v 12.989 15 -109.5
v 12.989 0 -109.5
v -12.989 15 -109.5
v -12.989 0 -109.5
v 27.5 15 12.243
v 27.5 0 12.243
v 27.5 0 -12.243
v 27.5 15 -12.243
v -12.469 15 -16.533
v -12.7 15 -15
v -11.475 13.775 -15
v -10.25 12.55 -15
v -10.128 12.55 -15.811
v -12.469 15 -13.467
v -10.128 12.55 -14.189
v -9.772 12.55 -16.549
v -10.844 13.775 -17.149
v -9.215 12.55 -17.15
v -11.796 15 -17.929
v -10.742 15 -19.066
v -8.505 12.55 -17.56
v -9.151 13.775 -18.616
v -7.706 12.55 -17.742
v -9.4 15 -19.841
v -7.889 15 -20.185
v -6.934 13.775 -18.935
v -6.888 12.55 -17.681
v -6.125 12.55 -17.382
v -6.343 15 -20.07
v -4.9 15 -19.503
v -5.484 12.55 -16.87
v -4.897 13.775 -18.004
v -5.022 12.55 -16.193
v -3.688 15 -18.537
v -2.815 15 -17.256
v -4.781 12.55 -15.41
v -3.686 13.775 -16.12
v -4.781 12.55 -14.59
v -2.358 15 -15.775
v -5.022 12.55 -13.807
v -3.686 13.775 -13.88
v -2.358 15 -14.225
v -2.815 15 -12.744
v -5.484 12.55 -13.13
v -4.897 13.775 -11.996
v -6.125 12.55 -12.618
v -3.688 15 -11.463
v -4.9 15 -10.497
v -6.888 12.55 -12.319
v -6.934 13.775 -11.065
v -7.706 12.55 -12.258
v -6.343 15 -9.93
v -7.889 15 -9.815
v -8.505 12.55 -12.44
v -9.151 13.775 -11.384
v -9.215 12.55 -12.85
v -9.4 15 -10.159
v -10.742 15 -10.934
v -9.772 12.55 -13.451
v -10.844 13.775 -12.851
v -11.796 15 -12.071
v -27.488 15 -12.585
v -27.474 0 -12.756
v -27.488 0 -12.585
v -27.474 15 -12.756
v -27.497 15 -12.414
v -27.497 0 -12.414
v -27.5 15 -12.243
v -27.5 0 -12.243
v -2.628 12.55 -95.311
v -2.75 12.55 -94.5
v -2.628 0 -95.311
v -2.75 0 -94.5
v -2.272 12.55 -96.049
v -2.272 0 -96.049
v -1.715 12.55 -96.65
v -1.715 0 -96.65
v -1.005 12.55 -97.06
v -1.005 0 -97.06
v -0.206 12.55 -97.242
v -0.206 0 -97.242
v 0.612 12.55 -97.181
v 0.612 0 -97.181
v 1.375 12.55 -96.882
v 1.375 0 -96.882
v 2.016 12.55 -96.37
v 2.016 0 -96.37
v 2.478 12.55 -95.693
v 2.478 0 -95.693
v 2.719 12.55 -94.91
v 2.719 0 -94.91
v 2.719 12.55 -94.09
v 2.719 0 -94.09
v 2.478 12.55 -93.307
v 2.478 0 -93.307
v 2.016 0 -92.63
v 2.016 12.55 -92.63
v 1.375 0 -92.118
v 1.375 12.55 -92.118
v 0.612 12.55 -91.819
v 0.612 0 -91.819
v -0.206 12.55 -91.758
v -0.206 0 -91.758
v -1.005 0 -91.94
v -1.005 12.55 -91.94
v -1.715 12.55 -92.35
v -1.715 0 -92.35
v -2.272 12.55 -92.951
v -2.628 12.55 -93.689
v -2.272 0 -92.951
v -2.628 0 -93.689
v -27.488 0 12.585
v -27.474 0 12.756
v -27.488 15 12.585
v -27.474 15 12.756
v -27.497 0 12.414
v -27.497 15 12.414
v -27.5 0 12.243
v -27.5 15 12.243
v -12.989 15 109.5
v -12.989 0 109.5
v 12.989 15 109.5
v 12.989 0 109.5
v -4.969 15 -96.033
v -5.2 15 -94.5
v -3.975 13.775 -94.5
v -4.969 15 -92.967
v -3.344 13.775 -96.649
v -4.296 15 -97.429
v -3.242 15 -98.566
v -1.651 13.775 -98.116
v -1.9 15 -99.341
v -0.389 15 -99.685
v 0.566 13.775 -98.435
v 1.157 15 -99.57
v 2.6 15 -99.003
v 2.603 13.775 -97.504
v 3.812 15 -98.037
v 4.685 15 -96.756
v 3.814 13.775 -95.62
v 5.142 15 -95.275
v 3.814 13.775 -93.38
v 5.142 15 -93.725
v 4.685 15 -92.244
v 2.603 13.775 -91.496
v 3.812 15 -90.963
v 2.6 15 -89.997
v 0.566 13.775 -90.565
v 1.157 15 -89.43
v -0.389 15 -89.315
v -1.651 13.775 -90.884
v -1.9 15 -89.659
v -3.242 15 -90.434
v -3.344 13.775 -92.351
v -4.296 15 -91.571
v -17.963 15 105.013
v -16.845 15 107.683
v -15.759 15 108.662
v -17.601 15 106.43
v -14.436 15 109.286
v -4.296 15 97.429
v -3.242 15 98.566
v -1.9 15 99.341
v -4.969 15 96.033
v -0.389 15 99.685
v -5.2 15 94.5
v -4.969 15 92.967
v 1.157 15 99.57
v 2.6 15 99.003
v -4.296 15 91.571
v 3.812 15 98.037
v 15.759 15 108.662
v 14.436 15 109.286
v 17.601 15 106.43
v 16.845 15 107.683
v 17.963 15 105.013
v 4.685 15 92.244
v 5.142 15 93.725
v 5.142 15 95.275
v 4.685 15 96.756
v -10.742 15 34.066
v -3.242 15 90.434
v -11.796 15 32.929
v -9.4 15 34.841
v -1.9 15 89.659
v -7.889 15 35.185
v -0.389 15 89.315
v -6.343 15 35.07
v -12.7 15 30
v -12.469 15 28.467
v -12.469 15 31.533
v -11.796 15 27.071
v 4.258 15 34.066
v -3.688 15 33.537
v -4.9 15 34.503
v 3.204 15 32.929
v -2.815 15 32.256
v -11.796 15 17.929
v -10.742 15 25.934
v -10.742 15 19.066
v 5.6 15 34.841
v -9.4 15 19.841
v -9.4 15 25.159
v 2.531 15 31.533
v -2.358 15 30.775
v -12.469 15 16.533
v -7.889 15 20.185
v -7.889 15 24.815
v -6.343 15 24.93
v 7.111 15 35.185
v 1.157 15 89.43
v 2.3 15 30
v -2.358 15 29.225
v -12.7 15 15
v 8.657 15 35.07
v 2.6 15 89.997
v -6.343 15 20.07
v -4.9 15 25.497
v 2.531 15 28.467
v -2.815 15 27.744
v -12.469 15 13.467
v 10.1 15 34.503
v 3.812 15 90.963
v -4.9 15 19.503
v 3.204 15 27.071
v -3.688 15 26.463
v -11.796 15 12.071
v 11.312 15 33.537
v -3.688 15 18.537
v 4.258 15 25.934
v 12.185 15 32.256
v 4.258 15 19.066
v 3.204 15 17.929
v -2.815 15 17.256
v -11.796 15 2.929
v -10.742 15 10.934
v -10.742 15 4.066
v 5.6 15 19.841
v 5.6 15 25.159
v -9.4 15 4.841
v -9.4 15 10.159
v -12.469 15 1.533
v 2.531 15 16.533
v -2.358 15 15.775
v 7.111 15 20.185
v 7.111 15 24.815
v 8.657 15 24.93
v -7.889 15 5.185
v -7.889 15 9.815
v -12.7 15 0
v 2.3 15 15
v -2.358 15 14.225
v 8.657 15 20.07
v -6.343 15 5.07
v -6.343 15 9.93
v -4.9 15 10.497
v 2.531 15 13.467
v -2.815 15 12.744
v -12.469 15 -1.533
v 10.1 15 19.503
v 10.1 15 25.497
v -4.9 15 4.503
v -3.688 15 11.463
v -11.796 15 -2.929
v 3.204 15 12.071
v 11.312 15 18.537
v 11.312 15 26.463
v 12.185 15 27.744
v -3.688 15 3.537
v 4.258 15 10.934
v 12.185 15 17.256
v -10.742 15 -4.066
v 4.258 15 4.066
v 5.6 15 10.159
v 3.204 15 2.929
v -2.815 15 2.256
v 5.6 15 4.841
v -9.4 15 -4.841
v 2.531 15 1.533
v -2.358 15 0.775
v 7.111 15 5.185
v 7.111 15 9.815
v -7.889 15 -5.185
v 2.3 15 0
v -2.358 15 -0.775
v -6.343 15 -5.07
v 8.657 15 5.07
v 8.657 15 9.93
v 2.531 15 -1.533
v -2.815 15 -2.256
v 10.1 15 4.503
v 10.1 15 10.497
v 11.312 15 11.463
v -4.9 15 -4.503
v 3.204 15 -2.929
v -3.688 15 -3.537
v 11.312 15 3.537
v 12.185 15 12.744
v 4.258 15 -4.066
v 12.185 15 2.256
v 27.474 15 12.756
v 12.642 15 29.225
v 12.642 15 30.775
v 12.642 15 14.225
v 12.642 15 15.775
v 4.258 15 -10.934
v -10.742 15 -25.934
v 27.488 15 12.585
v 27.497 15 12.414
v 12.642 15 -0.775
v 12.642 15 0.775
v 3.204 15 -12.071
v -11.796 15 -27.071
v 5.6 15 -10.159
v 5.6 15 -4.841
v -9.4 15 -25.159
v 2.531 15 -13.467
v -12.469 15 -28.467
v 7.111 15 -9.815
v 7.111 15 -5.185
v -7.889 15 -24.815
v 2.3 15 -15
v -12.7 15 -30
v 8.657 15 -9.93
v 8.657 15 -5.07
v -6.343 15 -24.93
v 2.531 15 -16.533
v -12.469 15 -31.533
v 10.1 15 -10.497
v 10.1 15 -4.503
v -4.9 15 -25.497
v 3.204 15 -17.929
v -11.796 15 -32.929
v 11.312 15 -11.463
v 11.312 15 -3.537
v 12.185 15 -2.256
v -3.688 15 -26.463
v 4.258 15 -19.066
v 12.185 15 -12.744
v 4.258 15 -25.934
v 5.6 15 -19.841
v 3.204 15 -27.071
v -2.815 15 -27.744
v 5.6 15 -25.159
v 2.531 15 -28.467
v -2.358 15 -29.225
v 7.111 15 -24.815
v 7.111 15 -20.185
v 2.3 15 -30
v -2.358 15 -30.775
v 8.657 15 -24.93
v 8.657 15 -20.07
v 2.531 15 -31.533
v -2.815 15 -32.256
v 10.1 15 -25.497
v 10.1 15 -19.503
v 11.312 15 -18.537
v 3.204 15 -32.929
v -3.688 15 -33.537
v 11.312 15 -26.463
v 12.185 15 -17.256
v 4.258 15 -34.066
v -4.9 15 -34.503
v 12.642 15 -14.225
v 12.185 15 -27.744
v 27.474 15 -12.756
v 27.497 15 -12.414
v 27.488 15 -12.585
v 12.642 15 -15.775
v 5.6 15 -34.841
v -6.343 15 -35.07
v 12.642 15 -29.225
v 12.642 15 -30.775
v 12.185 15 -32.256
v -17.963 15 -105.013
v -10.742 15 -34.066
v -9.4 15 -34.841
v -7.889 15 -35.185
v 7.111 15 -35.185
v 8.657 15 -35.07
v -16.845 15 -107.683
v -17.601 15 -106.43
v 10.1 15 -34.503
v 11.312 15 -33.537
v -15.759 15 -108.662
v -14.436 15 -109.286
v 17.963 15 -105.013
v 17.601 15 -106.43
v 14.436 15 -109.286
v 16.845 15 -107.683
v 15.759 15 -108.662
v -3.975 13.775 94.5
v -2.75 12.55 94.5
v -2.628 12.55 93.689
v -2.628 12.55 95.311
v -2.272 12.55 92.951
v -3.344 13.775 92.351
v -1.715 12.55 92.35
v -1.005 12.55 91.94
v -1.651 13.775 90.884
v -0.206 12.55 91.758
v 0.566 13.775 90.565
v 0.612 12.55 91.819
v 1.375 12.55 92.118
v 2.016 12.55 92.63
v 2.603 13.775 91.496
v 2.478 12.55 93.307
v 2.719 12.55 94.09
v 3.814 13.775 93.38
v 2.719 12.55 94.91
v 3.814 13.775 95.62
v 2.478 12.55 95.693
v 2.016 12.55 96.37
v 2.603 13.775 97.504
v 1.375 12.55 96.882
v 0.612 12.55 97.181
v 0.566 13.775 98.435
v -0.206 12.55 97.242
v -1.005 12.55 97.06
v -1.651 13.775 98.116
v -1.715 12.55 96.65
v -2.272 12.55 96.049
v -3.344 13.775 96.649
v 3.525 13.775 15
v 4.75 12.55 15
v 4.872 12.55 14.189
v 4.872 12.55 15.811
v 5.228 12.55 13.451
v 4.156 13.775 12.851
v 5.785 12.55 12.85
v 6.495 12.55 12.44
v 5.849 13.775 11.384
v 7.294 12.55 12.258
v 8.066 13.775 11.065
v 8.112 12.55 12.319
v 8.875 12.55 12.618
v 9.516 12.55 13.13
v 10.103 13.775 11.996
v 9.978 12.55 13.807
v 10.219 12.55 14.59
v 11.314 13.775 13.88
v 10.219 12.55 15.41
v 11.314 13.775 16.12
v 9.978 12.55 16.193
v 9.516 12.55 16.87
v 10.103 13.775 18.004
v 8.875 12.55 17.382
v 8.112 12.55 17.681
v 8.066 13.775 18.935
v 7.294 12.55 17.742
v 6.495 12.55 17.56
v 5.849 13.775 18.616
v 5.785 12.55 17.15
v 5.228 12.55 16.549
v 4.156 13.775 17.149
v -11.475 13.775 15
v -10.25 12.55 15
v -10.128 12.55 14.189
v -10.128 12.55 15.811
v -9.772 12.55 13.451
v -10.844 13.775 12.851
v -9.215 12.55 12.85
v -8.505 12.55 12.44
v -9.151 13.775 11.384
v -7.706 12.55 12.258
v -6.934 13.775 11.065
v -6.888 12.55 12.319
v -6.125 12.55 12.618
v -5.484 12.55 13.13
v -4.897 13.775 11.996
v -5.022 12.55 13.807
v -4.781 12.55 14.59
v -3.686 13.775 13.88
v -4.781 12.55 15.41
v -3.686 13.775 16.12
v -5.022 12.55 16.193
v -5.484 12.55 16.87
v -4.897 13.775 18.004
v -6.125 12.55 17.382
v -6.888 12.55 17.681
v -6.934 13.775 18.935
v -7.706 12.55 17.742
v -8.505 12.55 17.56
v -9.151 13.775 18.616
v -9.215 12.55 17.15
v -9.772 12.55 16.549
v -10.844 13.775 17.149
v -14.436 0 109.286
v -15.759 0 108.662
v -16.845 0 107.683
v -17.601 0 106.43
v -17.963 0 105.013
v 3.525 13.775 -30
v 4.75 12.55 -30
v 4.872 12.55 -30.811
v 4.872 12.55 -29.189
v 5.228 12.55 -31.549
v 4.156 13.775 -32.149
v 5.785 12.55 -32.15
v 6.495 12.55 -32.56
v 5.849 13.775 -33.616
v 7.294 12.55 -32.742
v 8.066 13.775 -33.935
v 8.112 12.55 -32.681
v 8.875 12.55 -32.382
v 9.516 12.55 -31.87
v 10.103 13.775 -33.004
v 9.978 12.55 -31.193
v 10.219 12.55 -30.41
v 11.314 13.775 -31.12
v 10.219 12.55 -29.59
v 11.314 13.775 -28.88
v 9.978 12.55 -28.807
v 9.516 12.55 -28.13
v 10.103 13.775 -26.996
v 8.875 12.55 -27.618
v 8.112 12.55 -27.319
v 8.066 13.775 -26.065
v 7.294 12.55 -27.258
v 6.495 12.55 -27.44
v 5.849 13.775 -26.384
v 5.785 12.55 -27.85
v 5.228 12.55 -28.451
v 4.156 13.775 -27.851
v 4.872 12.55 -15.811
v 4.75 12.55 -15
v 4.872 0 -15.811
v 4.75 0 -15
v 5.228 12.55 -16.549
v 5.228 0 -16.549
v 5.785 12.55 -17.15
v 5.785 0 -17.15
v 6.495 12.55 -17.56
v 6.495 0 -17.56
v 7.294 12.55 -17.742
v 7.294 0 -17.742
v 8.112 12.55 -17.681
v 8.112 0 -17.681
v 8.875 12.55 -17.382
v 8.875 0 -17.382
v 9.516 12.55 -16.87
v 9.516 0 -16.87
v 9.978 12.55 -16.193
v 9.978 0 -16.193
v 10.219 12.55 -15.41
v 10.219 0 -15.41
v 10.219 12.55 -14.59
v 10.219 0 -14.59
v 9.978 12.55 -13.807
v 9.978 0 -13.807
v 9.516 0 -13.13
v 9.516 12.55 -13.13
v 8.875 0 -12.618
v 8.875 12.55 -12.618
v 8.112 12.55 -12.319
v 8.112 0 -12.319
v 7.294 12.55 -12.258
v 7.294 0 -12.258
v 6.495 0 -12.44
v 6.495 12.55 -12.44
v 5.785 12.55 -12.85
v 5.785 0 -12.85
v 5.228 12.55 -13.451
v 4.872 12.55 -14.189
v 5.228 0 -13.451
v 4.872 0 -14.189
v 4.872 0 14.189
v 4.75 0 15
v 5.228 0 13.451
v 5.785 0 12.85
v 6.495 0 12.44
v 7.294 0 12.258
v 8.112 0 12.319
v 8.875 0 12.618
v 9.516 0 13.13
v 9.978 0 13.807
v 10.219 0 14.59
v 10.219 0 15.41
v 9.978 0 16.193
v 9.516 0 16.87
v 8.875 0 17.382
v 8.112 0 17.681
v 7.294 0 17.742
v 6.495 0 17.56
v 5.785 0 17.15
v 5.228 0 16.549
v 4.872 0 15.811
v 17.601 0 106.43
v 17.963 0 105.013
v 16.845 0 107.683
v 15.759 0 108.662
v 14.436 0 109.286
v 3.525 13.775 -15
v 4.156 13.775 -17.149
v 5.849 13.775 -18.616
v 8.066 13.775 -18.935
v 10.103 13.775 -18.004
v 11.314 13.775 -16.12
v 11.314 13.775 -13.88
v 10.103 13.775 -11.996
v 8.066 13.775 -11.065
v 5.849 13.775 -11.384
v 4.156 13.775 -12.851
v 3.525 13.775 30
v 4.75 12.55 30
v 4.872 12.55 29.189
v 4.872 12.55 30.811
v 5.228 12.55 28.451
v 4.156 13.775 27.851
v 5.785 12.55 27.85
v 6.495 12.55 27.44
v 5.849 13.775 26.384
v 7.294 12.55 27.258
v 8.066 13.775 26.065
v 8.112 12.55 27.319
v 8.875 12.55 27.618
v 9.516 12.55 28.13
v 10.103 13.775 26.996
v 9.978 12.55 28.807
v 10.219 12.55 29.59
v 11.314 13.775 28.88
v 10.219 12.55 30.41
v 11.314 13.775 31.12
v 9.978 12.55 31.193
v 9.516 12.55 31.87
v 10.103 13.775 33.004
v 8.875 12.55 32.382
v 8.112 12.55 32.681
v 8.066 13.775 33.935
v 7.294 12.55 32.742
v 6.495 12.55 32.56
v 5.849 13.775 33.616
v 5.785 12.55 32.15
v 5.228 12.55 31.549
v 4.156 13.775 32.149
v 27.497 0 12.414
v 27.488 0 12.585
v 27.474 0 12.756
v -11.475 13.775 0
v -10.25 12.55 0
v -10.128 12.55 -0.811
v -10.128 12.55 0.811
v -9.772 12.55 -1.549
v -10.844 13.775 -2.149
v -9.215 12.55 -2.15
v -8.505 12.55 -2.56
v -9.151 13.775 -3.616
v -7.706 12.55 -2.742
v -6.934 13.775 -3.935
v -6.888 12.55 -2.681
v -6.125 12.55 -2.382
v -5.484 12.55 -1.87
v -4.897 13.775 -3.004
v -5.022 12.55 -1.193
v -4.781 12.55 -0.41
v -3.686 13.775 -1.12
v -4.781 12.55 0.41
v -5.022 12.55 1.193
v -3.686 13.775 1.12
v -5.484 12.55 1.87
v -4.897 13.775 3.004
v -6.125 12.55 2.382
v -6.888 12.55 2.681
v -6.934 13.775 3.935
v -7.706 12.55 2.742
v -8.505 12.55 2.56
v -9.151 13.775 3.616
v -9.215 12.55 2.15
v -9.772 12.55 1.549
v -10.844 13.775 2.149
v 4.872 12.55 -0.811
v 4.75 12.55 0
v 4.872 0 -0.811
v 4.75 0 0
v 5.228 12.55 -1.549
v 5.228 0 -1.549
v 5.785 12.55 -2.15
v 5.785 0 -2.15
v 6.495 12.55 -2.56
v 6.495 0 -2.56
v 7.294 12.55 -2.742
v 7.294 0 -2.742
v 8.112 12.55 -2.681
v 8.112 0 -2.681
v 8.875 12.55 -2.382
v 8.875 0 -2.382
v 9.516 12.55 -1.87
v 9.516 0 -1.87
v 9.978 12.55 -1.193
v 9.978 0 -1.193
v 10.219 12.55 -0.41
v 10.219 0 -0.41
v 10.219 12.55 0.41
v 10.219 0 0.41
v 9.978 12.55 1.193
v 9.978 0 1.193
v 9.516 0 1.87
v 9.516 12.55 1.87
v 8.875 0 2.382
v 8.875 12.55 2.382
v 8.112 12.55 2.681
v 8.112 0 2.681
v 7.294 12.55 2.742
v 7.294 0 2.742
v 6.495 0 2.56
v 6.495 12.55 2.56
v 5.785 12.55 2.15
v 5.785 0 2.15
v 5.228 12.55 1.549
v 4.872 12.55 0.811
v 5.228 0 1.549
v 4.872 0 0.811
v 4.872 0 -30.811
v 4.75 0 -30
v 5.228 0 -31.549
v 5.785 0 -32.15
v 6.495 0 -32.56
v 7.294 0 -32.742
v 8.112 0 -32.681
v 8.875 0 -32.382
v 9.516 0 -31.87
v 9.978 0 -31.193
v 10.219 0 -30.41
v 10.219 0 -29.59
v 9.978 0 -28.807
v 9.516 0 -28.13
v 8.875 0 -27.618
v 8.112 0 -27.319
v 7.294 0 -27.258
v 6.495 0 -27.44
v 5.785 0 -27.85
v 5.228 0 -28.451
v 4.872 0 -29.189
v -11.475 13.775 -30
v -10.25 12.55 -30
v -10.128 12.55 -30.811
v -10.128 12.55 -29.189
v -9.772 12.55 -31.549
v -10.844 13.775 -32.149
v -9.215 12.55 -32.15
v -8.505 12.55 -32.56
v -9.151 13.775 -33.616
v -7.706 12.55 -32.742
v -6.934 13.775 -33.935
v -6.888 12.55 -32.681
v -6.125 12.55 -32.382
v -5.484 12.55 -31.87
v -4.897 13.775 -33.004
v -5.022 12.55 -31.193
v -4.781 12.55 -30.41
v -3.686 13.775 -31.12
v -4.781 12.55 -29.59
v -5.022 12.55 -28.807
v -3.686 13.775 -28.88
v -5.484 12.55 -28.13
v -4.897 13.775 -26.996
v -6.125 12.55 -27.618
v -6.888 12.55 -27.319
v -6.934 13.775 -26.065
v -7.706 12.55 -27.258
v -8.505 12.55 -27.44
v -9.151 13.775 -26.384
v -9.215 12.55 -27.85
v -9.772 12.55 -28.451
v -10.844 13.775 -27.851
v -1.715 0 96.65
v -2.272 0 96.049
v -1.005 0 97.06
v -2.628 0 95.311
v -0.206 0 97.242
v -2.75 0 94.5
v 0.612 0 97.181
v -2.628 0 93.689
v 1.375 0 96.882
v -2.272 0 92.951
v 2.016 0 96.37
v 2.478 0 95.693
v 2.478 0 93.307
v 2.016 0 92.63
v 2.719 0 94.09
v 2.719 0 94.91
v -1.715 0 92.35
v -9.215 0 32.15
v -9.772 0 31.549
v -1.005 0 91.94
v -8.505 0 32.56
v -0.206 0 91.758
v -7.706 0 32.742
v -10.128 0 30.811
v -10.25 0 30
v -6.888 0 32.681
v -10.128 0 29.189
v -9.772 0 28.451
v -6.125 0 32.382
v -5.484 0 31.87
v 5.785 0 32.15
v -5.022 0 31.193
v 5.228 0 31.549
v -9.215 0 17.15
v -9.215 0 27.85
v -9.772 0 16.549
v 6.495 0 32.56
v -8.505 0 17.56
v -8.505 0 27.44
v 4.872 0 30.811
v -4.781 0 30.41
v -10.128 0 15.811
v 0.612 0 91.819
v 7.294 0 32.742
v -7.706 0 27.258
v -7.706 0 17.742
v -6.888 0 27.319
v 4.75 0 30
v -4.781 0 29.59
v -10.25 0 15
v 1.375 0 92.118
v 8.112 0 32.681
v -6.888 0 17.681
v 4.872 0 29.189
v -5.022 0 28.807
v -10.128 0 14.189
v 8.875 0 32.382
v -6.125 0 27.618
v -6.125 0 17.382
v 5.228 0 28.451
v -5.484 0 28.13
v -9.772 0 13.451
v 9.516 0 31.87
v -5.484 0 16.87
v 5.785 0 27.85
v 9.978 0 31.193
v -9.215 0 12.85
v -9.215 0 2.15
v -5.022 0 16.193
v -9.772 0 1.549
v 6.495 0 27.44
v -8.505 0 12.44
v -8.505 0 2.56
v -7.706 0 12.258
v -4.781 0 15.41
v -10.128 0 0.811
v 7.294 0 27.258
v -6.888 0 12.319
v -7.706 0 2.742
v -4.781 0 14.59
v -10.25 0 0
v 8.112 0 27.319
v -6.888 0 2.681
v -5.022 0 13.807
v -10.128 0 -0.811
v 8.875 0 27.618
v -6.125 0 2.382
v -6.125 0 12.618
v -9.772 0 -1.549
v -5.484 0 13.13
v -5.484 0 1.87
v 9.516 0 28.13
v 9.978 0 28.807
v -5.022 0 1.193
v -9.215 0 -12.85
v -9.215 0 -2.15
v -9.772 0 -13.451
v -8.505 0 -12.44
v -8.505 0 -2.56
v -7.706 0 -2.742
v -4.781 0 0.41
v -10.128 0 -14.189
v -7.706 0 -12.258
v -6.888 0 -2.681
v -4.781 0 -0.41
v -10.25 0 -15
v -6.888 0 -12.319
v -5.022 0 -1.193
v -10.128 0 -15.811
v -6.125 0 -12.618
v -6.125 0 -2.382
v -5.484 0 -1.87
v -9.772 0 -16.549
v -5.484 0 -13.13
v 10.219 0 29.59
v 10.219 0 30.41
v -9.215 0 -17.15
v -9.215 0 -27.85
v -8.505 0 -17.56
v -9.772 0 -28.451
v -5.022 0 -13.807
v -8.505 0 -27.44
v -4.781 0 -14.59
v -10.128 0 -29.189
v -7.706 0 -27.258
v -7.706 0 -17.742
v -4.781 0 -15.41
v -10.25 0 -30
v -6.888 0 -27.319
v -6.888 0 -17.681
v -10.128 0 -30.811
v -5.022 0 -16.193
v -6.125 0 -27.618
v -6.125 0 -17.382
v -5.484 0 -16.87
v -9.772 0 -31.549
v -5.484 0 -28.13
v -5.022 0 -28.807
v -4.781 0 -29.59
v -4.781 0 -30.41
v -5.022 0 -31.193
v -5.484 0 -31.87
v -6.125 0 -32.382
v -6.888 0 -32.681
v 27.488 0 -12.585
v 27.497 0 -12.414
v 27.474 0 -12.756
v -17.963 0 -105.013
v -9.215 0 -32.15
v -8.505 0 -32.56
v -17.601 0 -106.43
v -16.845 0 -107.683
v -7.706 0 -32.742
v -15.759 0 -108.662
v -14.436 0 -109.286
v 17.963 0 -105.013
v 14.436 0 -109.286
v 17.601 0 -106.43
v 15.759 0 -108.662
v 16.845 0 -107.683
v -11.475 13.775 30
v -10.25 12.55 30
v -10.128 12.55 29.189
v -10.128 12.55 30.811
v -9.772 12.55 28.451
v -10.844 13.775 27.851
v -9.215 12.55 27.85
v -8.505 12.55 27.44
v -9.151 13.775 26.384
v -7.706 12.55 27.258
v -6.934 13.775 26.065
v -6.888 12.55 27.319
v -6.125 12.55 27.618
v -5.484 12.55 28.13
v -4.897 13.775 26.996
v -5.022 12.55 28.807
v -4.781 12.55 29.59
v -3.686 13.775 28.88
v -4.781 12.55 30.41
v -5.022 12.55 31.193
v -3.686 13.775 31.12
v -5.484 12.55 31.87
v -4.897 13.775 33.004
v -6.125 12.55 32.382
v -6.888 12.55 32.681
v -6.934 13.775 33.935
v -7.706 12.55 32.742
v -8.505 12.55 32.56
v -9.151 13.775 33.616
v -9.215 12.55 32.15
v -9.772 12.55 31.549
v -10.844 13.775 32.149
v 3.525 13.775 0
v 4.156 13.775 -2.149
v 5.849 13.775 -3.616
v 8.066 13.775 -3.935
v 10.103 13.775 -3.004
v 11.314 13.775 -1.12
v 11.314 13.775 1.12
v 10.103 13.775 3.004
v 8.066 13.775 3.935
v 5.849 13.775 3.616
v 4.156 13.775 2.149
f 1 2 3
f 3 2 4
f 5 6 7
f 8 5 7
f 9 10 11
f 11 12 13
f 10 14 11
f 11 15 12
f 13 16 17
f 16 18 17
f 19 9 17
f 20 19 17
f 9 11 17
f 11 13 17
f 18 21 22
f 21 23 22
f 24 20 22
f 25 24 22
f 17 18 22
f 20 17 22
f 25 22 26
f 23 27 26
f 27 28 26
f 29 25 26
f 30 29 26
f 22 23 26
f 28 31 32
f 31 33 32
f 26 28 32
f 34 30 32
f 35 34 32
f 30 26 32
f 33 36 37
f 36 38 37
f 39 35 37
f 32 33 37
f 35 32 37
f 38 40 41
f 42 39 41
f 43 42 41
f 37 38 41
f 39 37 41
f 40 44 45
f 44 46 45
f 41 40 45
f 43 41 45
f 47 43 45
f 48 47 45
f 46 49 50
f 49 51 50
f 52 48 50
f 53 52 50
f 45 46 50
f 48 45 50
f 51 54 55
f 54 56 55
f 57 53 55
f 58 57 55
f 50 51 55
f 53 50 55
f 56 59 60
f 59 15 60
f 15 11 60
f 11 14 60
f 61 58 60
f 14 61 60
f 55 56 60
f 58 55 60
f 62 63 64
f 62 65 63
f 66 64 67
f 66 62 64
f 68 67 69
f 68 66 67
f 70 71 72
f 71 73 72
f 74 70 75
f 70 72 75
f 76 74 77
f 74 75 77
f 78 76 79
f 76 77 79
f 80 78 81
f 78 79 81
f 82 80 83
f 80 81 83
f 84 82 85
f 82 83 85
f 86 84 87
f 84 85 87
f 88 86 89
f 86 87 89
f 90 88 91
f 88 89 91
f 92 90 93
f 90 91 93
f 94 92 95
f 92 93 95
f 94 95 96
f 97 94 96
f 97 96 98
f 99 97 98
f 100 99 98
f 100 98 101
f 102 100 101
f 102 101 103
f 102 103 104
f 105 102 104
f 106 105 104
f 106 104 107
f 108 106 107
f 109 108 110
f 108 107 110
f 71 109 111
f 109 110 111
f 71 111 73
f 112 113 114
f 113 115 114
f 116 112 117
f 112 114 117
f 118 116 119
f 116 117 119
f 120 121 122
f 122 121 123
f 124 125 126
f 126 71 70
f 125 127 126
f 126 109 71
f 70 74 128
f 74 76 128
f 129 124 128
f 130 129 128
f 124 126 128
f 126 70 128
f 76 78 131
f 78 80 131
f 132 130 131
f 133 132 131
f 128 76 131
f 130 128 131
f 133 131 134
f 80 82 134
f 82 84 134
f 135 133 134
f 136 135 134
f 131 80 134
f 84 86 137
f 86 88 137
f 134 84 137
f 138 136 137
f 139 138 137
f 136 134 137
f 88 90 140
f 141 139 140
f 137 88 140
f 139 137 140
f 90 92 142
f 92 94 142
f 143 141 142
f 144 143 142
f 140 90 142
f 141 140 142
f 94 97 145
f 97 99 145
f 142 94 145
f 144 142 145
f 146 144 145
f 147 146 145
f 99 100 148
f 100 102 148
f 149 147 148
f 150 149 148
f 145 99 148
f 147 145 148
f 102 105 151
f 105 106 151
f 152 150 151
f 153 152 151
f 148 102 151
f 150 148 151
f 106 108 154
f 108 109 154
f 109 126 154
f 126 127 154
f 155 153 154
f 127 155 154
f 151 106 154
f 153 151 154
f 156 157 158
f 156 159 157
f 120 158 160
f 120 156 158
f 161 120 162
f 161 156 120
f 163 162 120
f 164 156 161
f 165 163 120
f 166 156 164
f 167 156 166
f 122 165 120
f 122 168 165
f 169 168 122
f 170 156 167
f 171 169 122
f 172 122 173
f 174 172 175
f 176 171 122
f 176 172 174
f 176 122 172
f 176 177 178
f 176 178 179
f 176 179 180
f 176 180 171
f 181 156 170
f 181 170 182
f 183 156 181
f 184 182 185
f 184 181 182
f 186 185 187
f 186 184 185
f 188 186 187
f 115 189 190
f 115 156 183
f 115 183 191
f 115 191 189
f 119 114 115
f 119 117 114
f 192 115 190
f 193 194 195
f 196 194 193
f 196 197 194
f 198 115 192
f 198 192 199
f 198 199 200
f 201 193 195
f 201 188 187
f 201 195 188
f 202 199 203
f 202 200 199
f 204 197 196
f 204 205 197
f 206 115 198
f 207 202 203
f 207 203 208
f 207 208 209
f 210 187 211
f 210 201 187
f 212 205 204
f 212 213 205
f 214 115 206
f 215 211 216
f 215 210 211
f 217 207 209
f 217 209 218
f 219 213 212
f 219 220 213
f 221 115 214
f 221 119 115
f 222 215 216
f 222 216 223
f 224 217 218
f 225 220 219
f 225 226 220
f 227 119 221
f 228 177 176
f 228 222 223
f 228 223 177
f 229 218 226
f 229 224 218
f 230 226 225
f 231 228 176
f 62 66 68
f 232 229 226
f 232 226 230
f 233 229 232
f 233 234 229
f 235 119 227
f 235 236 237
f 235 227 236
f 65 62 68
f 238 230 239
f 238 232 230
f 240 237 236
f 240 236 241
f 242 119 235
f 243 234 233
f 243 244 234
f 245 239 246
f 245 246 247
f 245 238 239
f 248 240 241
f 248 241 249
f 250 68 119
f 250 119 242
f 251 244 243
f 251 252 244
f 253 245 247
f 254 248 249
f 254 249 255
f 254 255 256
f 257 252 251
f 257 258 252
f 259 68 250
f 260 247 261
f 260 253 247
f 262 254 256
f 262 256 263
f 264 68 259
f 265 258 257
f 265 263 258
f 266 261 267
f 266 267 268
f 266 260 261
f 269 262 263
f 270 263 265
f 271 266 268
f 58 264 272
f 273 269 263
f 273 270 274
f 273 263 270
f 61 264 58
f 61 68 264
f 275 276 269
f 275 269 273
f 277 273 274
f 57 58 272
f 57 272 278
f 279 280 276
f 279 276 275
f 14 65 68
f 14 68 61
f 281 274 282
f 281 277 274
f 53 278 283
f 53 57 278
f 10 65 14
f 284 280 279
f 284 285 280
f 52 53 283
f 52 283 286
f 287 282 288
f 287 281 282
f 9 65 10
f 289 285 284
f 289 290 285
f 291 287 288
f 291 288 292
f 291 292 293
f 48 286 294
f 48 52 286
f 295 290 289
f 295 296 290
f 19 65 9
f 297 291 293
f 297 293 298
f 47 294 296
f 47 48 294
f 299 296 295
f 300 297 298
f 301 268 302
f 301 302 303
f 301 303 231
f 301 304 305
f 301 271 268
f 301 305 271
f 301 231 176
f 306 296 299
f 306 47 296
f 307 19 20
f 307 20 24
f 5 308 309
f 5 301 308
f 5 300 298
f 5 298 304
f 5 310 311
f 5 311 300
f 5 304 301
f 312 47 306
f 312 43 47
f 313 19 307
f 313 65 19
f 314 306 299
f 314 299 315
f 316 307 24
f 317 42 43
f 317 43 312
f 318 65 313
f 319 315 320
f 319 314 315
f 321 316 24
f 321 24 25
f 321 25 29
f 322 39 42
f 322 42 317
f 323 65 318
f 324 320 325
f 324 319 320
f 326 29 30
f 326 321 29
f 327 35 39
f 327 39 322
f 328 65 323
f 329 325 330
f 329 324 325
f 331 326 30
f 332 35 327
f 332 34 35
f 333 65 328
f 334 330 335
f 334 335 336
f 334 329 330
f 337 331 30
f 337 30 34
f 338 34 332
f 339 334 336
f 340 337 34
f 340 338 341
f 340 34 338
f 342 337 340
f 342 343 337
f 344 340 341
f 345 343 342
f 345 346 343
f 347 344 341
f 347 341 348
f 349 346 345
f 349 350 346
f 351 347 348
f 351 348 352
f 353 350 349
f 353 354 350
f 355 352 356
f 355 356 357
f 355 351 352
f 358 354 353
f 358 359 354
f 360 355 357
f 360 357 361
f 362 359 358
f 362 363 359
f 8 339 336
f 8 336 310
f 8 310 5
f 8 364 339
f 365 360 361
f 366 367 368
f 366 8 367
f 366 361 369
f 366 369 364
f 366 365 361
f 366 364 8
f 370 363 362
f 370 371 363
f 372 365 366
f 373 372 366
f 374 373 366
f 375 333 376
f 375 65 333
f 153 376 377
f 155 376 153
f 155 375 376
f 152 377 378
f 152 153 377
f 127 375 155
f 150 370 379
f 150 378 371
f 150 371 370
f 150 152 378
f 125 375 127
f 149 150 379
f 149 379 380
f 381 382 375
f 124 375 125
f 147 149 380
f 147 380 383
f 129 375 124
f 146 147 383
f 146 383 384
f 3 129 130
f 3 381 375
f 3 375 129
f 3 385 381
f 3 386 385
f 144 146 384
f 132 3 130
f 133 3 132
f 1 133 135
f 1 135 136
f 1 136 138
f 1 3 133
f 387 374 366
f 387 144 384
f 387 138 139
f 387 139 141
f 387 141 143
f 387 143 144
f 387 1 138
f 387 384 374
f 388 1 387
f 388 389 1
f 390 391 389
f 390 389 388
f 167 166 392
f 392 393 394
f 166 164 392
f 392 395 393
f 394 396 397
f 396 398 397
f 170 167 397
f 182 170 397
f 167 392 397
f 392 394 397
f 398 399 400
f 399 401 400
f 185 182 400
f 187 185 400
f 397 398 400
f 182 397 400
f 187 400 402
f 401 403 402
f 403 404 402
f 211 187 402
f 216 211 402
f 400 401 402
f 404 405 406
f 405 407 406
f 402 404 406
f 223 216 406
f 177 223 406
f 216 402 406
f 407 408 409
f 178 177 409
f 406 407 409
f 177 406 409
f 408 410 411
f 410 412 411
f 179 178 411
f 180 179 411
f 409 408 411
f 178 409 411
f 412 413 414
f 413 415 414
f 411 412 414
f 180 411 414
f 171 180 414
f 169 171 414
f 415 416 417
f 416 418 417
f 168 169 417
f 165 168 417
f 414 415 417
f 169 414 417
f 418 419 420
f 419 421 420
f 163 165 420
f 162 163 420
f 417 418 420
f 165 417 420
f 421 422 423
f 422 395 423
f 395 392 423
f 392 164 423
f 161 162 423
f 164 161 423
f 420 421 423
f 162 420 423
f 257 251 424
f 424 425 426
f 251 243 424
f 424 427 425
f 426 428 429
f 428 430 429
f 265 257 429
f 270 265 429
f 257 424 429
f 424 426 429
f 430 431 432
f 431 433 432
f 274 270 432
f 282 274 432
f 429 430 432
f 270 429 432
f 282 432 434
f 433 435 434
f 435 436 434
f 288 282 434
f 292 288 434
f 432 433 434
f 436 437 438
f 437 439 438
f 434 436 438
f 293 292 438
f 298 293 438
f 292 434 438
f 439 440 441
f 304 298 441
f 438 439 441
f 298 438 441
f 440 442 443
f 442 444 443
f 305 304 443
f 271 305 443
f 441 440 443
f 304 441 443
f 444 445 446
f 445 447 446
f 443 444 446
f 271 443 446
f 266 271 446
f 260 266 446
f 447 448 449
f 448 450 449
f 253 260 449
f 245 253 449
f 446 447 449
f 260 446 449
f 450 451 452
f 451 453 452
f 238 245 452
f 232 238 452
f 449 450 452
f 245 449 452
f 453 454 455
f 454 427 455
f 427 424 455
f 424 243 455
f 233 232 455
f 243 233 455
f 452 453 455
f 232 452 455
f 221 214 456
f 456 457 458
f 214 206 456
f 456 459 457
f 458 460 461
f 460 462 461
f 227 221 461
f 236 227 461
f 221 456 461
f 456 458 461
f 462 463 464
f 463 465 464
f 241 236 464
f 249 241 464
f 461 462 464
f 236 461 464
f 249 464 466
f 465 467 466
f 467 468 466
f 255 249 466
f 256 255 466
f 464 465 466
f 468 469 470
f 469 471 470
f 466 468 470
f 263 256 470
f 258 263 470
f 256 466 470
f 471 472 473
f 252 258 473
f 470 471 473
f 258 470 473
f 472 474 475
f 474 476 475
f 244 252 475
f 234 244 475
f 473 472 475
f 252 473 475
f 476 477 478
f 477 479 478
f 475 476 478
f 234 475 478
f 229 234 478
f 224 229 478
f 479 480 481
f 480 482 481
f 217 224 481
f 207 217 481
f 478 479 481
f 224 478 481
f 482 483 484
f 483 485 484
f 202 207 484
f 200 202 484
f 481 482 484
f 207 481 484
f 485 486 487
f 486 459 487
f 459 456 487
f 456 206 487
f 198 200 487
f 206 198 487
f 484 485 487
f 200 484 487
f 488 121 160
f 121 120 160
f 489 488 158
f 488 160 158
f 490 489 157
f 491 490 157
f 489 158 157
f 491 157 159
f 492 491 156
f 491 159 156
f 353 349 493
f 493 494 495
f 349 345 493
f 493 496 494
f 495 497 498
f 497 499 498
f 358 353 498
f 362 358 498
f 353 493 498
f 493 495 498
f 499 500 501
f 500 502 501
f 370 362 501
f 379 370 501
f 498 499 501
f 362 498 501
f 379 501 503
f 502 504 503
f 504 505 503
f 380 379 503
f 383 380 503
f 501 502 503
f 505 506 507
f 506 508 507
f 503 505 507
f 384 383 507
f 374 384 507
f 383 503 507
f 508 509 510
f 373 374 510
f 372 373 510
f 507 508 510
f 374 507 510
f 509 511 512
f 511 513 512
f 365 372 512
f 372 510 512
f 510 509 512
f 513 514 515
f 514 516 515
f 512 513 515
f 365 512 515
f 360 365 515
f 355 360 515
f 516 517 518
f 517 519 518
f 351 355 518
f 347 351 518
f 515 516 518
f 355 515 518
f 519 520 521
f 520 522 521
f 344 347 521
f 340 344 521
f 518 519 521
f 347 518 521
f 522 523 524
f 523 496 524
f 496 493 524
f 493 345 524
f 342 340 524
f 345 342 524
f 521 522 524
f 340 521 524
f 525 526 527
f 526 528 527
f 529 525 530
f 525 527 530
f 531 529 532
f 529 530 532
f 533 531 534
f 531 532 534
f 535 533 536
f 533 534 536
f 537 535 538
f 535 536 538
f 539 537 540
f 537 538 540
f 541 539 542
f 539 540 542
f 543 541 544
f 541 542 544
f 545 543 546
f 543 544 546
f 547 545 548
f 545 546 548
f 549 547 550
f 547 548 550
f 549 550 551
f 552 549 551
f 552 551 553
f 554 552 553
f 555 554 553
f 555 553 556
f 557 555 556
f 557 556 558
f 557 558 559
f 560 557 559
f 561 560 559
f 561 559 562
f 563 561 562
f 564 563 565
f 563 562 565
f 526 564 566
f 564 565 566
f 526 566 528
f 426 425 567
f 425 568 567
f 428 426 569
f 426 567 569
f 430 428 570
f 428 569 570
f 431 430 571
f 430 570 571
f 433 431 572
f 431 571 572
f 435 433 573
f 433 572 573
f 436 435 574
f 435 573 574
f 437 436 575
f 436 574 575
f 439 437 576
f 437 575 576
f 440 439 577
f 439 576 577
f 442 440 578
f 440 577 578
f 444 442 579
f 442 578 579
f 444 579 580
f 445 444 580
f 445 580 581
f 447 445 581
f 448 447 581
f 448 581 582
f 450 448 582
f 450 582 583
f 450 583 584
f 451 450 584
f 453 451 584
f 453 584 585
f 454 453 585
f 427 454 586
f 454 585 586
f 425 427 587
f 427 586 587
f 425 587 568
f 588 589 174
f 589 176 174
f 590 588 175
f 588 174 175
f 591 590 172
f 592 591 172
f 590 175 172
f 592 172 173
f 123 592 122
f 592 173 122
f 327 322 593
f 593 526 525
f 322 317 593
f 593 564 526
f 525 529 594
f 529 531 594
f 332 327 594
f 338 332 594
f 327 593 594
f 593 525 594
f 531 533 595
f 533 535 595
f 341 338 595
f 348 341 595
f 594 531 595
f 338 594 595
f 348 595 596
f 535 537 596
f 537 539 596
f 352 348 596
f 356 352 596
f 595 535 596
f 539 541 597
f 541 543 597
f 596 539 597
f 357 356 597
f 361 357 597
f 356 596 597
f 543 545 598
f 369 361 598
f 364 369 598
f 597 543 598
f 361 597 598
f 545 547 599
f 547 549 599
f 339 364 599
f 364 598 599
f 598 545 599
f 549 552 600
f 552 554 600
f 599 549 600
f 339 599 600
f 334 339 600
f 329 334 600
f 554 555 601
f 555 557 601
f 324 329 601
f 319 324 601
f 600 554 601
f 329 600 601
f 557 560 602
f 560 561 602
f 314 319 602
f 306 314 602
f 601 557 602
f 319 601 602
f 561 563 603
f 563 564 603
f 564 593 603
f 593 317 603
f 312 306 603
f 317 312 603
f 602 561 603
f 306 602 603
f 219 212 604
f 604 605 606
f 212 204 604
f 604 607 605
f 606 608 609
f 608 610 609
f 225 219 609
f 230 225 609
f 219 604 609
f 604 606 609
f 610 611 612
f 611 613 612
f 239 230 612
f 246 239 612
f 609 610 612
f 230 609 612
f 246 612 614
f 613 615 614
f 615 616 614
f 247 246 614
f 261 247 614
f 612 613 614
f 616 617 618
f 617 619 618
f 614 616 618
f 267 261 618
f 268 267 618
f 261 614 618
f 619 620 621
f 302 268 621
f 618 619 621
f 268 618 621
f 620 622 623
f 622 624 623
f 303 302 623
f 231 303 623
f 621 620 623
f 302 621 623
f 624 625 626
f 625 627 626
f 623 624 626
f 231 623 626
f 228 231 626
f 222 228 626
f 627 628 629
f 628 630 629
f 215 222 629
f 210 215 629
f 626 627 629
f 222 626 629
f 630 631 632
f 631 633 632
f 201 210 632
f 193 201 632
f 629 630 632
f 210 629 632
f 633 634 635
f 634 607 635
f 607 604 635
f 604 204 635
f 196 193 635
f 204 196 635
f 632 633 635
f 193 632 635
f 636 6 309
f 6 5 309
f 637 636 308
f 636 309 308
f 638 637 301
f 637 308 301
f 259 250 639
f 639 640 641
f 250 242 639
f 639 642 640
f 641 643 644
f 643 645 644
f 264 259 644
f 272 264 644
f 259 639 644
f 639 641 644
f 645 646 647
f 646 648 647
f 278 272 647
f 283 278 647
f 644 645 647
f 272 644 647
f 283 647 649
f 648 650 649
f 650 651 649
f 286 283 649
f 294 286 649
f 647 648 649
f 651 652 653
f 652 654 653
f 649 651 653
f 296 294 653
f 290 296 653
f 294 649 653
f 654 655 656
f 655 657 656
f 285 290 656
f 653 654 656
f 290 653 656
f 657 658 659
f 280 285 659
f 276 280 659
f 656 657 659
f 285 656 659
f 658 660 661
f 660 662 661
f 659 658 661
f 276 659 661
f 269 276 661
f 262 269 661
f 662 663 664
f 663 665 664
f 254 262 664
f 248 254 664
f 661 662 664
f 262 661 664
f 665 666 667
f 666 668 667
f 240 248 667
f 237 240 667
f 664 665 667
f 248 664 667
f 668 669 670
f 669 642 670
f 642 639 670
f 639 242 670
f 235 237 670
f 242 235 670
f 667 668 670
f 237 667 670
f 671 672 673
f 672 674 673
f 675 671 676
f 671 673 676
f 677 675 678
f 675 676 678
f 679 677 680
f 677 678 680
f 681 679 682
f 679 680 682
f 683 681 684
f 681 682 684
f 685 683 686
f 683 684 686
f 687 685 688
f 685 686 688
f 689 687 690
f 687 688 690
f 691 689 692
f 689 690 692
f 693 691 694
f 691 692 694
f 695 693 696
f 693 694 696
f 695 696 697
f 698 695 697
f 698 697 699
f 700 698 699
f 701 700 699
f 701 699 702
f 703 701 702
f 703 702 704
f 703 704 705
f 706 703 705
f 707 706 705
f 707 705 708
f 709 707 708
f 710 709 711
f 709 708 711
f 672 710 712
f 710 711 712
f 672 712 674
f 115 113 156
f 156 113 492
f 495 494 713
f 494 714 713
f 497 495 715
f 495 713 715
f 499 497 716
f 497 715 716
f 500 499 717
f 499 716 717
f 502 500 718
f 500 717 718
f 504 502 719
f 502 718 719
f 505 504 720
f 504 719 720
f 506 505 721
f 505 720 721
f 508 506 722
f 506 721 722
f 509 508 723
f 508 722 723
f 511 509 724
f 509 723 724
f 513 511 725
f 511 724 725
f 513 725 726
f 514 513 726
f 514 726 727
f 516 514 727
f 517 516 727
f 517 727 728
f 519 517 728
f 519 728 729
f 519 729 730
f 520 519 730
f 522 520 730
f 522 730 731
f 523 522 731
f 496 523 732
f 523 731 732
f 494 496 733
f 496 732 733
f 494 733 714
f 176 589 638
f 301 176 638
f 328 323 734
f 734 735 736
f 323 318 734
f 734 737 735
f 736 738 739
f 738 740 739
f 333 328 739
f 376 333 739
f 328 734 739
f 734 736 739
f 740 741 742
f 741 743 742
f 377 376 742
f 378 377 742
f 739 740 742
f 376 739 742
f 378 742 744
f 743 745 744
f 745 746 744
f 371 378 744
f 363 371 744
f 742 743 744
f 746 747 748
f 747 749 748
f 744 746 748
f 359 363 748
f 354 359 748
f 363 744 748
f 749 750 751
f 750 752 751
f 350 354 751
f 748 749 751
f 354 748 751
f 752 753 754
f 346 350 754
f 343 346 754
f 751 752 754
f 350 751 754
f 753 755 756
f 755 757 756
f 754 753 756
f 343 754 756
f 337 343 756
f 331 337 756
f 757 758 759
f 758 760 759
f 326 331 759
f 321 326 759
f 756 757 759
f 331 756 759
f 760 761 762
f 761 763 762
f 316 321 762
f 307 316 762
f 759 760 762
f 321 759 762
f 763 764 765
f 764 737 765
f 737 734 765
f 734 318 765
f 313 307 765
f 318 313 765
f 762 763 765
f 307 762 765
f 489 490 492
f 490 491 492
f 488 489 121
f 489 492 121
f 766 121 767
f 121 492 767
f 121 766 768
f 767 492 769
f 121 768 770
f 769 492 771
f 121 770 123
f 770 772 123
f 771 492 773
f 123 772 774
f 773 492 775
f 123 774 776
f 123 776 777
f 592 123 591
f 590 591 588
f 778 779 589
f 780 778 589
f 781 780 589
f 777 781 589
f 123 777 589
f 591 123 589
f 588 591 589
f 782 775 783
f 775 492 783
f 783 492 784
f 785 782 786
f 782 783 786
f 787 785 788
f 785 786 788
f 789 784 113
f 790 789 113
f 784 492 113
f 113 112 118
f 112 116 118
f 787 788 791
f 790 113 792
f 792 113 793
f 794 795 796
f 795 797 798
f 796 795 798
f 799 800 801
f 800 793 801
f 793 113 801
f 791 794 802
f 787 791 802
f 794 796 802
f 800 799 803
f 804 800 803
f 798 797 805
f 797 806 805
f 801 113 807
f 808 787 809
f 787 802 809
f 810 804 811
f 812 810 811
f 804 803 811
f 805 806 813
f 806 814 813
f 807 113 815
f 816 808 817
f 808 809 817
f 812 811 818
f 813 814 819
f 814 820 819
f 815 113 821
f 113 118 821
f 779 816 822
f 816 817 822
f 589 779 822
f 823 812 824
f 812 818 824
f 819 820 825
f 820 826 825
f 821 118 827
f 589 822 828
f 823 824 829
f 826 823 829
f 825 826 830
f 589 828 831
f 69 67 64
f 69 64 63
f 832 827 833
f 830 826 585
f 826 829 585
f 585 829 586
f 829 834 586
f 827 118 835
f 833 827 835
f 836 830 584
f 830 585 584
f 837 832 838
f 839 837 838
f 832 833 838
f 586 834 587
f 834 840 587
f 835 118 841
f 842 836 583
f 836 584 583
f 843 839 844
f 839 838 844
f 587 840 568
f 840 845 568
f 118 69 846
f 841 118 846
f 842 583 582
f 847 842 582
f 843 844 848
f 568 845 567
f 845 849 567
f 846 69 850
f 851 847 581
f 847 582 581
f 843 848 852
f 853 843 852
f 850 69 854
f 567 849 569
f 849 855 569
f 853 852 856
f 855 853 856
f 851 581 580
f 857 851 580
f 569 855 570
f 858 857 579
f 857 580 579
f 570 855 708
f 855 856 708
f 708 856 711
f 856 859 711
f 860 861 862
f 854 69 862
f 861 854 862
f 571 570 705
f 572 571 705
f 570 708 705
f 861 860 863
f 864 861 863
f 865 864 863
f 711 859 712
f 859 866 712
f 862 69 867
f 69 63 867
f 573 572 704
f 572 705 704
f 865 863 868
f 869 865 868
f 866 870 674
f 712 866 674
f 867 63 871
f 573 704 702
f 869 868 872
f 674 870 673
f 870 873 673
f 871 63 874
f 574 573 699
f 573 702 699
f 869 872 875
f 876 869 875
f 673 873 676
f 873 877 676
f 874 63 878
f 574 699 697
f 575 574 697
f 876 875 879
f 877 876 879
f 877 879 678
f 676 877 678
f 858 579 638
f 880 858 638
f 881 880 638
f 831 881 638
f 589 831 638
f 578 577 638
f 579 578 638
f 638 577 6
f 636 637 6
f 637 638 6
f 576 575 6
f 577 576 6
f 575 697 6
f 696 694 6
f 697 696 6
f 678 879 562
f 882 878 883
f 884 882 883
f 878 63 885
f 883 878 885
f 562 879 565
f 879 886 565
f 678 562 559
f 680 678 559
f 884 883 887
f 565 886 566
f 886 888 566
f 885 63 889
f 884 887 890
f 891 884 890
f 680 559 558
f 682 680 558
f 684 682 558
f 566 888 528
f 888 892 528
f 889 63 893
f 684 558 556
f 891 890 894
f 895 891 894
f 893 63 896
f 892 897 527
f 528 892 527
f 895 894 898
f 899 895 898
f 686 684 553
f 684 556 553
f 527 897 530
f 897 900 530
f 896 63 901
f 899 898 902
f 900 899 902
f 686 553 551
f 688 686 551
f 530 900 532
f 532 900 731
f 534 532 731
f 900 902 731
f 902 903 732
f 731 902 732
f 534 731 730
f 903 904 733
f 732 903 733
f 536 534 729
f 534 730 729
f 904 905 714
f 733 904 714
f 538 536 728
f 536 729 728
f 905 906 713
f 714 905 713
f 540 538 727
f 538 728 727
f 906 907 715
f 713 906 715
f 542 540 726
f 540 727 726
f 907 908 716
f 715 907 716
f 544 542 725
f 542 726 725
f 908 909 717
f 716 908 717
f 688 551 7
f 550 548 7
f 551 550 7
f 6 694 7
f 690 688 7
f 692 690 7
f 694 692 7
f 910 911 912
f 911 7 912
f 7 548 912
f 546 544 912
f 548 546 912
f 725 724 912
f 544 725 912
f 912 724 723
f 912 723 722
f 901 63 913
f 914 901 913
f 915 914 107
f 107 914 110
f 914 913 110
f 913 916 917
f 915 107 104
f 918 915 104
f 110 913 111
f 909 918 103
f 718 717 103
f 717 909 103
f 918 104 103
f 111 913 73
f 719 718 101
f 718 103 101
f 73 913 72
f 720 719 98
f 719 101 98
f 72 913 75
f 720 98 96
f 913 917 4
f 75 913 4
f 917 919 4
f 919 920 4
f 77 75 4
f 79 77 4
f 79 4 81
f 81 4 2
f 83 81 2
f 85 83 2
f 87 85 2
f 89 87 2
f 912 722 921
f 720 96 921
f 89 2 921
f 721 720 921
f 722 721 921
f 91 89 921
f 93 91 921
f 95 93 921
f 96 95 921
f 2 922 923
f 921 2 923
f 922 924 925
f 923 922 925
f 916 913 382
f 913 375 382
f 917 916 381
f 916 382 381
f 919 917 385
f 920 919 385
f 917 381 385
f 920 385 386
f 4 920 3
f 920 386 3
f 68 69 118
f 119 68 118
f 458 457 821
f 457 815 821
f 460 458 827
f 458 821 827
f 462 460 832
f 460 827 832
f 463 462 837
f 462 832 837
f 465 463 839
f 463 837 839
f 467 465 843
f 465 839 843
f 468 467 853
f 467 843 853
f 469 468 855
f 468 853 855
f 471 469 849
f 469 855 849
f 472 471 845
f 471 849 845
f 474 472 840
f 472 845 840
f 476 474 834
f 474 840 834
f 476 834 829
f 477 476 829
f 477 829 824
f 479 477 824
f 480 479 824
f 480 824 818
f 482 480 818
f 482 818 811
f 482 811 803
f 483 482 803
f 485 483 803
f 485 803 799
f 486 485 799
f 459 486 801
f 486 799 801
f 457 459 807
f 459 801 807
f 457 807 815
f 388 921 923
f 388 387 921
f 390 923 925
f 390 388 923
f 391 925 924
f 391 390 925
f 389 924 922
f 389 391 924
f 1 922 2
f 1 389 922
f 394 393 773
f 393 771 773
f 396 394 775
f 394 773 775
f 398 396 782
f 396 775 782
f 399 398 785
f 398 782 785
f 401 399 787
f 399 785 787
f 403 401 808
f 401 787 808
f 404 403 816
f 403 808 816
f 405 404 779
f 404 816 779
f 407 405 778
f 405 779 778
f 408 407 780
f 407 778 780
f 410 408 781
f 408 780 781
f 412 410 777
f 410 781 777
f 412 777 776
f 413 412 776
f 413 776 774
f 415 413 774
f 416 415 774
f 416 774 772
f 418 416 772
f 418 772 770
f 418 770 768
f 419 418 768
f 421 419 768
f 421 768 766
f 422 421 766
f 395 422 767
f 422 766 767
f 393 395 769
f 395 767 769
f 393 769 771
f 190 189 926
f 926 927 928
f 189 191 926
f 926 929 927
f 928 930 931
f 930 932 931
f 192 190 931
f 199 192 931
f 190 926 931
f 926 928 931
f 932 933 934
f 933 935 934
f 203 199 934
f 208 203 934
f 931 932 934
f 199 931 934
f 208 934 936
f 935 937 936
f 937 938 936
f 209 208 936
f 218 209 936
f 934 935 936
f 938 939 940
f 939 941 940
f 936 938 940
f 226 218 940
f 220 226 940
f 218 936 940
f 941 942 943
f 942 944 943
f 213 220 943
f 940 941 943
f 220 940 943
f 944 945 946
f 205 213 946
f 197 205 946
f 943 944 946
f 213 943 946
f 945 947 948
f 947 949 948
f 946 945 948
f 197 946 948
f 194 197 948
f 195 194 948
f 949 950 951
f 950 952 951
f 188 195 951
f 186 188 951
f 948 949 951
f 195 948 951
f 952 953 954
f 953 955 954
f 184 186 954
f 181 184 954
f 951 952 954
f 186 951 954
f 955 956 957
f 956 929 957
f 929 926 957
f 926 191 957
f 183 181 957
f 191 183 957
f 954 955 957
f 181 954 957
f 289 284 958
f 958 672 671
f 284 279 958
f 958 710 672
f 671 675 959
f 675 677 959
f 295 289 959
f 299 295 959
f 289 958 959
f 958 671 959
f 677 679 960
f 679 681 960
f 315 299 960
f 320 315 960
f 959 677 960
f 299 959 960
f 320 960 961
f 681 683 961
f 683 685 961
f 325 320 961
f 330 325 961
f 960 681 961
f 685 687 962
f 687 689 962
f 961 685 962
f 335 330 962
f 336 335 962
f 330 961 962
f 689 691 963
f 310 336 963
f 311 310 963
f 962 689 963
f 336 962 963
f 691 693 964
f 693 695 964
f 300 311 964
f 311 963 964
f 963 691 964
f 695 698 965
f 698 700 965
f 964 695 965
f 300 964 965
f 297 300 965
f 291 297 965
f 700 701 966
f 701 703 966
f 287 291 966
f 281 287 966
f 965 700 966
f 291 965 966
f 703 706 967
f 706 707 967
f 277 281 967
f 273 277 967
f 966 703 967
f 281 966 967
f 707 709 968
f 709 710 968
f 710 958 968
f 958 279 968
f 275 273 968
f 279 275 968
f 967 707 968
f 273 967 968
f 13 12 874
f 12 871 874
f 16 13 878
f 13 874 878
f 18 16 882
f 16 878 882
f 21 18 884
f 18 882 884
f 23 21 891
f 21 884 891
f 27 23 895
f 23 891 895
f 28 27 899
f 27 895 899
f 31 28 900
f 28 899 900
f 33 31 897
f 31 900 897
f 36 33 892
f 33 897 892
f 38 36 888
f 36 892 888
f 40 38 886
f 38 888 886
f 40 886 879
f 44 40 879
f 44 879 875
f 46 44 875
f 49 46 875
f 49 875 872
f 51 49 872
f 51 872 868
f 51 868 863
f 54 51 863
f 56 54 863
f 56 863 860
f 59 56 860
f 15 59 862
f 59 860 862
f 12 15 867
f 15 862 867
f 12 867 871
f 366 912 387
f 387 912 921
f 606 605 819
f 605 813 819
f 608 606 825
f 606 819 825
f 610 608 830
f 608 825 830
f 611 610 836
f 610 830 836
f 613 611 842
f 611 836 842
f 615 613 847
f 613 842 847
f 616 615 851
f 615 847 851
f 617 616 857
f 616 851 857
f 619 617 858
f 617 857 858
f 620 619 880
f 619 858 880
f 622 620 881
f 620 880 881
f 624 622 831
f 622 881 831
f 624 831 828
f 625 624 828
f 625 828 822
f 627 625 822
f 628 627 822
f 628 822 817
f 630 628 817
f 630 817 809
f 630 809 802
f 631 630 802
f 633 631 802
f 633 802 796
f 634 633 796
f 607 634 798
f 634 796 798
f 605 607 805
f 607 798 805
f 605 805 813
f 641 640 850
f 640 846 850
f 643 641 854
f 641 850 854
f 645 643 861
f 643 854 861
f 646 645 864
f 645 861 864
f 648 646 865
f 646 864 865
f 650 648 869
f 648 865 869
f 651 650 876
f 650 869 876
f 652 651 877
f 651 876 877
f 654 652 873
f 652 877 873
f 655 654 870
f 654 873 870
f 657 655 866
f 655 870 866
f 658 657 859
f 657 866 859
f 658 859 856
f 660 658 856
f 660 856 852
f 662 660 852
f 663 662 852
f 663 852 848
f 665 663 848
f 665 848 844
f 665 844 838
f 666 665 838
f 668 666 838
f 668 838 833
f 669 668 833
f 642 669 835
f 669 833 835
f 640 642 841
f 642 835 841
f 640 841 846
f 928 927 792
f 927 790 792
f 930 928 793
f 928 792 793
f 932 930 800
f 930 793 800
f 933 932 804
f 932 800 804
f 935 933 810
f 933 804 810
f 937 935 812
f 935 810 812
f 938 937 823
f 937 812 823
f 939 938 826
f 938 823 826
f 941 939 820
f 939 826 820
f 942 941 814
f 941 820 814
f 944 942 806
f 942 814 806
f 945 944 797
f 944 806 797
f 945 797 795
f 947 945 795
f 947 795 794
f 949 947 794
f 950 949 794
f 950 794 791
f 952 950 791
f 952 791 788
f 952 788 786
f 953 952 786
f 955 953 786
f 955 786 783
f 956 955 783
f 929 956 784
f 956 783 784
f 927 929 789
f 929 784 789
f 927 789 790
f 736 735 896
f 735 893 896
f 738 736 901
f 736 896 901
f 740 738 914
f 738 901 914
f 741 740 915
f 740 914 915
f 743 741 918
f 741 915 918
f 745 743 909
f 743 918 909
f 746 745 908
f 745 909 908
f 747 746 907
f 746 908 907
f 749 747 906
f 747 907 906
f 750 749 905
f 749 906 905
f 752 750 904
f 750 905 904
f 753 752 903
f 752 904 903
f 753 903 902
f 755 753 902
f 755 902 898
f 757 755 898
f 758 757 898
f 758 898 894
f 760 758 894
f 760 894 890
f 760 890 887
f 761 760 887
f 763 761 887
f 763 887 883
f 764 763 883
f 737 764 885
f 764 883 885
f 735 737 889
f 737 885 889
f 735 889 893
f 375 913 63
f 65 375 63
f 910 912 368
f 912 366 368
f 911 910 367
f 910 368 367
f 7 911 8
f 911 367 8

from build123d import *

# Parameters (mm, degrees)
BOSS_EXTRU_1_DEPTH                             = 15
FRAISAGE_POUR_VIS_T_TE_FRAIS_E_M51_D           = 5.5
FRAISAGE_POUR_VIS_T_TE_FRAIS_E_M51_CSINK_D     = 10.4
FRAISAGE_POUR_VIS_T_TE_FRAIS_E_M51_CSINK_ANGLE = 90
CONG_2_R                                       = 5


with BuildPart() as part:
    # Esquisse1 → Boss.-Extru.1 (new body)
    with BuildSketch(Plane(origin=(0, 0, 0), x_dir=(1, 0, 0), z_dir=(0, 1, 0))):
        Polygon((-17.5, 109.5), (-27.5, 12.5), (-27.5, -12.5), (-17.5, -109.5), (17.5, -109.5), (27.5, -12.5), (27.5, 12.5), (17.5, 109.5), align=None)
    extrude(amount=BOSS_EXTRU_1_DEPTH)

    # Fraisage pour vis à tête fraisée M51 (through all)
    with Locations(Plane(origin=(0, 15, 0), x_dir=(1, 0, 0), z_dir=(0, 1, 0))):
        with Locations((-7.5, 30), (7.5, 30), (7.5, 15), (-7.5, 15), (-7.5, 0), (7.5, 0), (7.5, -15), (-7.5, -15), (-7.5, -30), (7.5, -30), (0, -94.5), (0, 94.5)):
            CounterSinkHole(FRAISAGE_POUR_VIS_T_TE_FRAIS_E_M51_D / 2, FRAISAGE_POUR_VIS_T_TE_FRAIS_E_M51_CSINK_D / 2, counter_sink_angle=FRAISAGE_POUR_VIS_T_TE_FRAIS_E_M51_CSINK_ANGLE)

    # Congé2
    cong_2_edges = [part.edges().sort_by_distance(p)[0] for p in [
        (27.5, 7.5, -12.5),
        (27.5, 7.5, 12.5),
        (17.5, 7.5, 109.5),
        (-17.5, 7.5, 109.5),
        (-27.5, 7.5, 12.5),
        (-27.5, 7.5, -12.5),
        (-17.5, 7.5, -109.5),
        (17.5, 7.5, -109.5),
    ]]
    fillet(cong_2_edges, radius=CONG_2_R)


solid = part.part
